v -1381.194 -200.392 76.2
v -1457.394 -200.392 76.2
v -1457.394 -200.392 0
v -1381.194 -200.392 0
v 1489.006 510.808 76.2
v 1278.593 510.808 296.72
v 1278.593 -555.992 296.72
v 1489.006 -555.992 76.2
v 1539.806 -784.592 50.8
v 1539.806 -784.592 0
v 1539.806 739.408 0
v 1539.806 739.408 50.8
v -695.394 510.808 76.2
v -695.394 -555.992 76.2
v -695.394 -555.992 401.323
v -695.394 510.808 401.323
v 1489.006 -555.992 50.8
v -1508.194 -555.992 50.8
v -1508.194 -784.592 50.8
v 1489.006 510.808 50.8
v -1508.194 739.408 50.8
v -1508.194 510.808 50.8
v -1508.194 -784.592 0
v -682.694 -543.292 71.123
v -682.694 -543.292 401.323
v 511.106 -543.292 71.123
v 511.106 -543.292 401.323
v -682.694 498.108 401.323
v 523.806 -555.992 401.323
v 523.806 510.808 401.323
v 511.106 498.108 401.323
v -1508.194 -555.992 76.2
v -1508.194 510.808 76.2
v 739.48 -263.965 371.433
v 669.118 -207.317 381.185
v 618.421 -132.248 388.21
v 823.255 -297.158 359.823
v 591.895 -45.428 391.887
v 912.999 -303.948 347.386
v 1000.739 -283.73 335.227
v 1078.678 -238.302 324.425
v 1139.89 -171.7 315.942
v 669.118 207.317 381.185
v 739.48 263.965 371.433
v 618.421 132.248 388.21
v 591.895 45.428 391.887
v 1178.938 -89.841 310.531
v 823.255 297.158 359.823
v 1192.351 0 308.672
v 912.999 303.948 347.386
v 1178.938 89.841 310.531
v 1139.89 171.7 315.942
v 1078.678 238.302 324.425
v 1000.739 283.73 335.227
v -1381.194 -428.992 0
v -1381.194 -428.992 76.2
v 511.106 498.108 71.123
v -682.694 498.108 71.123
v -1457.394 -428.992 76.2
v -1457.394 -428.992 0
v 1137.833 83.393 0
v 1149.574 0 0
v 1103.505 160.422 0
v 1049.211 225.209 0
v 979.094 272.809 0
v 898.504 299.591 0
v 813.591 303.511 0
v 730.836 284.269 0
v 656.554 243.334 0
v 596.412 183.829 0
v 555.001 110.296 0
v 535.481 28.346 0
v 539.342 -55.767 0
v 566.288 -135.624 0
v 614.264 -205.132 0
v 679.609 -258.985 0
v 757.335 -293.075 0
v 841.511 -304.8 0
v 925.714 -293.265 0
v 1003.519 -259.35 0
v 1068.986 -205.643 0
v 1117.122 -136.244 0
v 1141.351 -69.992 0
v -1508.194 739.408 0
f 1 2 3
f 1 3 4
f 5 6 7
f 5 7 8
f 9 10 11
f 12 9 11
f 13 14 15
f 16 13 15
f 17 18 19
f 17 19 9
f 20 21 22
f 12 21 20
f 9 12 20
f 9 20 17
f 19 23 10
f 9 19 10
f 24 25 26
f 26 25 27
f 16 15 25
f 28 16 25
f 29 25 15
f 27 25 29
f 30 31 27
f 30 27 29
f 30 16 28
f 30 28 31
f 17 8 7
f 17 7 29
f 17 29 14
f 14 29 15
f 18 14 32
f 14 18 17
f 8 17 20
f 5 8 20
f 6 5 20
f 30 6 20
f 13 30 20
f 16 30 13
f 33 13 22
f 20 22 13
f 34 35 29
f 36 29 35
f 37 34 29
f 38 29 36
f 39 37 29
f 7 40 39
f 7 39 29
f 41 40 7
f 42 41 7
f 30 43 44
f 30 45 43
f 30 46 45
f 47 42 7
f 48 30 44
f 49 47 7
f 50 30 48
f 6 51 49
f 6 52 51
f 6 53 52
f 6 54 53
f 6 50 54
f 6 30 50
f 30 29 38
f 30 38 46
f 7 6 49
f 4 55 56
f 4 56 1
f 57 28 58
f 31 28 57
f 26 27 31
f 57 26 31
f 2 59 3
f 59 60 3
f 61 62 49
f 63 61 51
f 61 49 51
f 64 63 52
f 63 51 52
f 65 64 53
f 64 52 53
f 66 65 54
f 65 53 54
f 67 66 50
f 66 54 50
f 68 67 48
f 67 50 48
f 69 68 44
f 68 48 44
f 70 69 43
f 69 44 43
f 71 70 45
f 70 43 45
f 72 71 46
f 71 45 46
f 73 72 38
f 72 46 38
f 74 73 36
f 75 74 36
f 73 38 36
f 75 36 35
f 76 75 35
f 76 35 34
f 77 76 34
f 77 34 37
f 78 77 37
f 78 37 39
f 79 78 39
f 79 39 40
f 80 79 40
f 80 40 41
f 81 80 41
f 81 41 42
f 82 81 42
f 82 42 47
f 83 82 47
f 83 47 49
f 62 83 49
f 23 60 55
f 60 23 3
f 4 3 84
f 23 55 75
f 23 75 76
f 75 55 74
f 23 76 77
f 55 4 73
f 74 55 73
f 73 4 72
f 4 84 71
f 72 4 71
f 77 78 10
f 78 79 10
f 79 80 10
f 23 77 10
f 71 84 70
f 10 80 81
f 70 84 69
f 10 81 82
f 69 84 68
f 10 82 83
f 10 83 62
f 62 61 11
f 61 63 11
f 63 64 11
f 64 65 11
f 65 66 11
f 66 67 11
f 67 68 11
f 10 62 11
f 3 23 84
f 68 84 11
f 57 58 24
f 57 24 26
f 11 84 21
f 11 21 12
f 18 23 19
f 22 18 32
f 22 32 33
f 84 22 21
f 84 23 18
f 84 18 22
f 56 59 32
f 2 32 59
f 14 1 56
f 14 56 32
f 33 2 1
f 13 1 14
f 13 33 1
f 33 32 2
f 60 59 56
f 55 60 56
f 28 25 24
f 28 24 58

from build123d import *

# Parameters (mm, degrees)
F0_W     = 3048
F0_H     = 1524
F0_W_2   = 76.2
F0_H_2   = 228.6
F1_DEPTH = 50.8
F2_W     = 2997.2
F2_H     = 1066.8
F2_W_2   = 76.2
F2_H_2   = 228.6
F3_DEPTH = 25.4
F5_DEPTH = 1066.8
F6_R     = 304.8
F7_DEPTH = 676.4650551683
F8_W     = 1193.8
F8_H     = 1041.4
F9_DEPTH = 330.2


with BuildPart() as f1:
    # F0 (on Top) → F1 (new body)
    with BuildSketch(Plane.XY):
        with Locations((15.8064851761, -22.5919132233)):
            Rectangle(F0_W, F0_H)
        with Locations((-1419.2935148239, -314.6919132233)):
            Rectangle(F0_W_2, F0_H_2, mode=Mode.SUBTRACT)
    extrude(amount=F1_DEPTH)

    # F2 (on face) → F3 (join)
    with BuildSketch(Plane.XY.offset(50.8)):
        with Locations((-9.5935148239, -22.5919132233)):
            Rectangle(F2_W, F2_H)
        with Locations((-1419.2935148239, -314.6919132233)):
            Rectangle(F2_W_2, F2_H_2, mode=Mode.SUBTRACT)
    extrude(amount=F3_DEPTH)

    # F4 (on face) → F5 (join)
    with BuildSketch(Plane(origin=(0, 510.8080867767, 0), x_dir=(-1, 0, 0), z_dir=(0, 1, 0))):
        Polygon((-1278.5927280739, 296.7200463045), (-1489.0064851761, 76.2), (695.3935148239, 76.2), (695.3935148239, 401.3227591385), (-523.8064851761, 401.3227591385), align=None)
    extrude(amount=-F5_DEPTH)

    # F6 (on face) → F7 (cut, through all)
    with BuildSketch(Plane(origin=(64.4402743808, 0, 464.9844279694), x_dir=(0.9905331272, 0, -0.1372739014), z_dir=(0.1372739014, 0, 0.9905331272))):
        with Locations((833.8910219943, 0)):
            Circle(F6_R)
    extrude(amount=-F7_DEPTH, mode=Mode.SUBTRACT)

    # F8 (on face) → F9 (cut)
    with BuildSketch(Plane.XY.offset(401.3227591385)):
        with Locations((-85.7935148239, -22.5919132233)):
            Rectangle(F8_W, F8_H)
    extrude(amount=-F9_DEPTH, mode=Mode.SUBTRACT)


solid = f1.part
